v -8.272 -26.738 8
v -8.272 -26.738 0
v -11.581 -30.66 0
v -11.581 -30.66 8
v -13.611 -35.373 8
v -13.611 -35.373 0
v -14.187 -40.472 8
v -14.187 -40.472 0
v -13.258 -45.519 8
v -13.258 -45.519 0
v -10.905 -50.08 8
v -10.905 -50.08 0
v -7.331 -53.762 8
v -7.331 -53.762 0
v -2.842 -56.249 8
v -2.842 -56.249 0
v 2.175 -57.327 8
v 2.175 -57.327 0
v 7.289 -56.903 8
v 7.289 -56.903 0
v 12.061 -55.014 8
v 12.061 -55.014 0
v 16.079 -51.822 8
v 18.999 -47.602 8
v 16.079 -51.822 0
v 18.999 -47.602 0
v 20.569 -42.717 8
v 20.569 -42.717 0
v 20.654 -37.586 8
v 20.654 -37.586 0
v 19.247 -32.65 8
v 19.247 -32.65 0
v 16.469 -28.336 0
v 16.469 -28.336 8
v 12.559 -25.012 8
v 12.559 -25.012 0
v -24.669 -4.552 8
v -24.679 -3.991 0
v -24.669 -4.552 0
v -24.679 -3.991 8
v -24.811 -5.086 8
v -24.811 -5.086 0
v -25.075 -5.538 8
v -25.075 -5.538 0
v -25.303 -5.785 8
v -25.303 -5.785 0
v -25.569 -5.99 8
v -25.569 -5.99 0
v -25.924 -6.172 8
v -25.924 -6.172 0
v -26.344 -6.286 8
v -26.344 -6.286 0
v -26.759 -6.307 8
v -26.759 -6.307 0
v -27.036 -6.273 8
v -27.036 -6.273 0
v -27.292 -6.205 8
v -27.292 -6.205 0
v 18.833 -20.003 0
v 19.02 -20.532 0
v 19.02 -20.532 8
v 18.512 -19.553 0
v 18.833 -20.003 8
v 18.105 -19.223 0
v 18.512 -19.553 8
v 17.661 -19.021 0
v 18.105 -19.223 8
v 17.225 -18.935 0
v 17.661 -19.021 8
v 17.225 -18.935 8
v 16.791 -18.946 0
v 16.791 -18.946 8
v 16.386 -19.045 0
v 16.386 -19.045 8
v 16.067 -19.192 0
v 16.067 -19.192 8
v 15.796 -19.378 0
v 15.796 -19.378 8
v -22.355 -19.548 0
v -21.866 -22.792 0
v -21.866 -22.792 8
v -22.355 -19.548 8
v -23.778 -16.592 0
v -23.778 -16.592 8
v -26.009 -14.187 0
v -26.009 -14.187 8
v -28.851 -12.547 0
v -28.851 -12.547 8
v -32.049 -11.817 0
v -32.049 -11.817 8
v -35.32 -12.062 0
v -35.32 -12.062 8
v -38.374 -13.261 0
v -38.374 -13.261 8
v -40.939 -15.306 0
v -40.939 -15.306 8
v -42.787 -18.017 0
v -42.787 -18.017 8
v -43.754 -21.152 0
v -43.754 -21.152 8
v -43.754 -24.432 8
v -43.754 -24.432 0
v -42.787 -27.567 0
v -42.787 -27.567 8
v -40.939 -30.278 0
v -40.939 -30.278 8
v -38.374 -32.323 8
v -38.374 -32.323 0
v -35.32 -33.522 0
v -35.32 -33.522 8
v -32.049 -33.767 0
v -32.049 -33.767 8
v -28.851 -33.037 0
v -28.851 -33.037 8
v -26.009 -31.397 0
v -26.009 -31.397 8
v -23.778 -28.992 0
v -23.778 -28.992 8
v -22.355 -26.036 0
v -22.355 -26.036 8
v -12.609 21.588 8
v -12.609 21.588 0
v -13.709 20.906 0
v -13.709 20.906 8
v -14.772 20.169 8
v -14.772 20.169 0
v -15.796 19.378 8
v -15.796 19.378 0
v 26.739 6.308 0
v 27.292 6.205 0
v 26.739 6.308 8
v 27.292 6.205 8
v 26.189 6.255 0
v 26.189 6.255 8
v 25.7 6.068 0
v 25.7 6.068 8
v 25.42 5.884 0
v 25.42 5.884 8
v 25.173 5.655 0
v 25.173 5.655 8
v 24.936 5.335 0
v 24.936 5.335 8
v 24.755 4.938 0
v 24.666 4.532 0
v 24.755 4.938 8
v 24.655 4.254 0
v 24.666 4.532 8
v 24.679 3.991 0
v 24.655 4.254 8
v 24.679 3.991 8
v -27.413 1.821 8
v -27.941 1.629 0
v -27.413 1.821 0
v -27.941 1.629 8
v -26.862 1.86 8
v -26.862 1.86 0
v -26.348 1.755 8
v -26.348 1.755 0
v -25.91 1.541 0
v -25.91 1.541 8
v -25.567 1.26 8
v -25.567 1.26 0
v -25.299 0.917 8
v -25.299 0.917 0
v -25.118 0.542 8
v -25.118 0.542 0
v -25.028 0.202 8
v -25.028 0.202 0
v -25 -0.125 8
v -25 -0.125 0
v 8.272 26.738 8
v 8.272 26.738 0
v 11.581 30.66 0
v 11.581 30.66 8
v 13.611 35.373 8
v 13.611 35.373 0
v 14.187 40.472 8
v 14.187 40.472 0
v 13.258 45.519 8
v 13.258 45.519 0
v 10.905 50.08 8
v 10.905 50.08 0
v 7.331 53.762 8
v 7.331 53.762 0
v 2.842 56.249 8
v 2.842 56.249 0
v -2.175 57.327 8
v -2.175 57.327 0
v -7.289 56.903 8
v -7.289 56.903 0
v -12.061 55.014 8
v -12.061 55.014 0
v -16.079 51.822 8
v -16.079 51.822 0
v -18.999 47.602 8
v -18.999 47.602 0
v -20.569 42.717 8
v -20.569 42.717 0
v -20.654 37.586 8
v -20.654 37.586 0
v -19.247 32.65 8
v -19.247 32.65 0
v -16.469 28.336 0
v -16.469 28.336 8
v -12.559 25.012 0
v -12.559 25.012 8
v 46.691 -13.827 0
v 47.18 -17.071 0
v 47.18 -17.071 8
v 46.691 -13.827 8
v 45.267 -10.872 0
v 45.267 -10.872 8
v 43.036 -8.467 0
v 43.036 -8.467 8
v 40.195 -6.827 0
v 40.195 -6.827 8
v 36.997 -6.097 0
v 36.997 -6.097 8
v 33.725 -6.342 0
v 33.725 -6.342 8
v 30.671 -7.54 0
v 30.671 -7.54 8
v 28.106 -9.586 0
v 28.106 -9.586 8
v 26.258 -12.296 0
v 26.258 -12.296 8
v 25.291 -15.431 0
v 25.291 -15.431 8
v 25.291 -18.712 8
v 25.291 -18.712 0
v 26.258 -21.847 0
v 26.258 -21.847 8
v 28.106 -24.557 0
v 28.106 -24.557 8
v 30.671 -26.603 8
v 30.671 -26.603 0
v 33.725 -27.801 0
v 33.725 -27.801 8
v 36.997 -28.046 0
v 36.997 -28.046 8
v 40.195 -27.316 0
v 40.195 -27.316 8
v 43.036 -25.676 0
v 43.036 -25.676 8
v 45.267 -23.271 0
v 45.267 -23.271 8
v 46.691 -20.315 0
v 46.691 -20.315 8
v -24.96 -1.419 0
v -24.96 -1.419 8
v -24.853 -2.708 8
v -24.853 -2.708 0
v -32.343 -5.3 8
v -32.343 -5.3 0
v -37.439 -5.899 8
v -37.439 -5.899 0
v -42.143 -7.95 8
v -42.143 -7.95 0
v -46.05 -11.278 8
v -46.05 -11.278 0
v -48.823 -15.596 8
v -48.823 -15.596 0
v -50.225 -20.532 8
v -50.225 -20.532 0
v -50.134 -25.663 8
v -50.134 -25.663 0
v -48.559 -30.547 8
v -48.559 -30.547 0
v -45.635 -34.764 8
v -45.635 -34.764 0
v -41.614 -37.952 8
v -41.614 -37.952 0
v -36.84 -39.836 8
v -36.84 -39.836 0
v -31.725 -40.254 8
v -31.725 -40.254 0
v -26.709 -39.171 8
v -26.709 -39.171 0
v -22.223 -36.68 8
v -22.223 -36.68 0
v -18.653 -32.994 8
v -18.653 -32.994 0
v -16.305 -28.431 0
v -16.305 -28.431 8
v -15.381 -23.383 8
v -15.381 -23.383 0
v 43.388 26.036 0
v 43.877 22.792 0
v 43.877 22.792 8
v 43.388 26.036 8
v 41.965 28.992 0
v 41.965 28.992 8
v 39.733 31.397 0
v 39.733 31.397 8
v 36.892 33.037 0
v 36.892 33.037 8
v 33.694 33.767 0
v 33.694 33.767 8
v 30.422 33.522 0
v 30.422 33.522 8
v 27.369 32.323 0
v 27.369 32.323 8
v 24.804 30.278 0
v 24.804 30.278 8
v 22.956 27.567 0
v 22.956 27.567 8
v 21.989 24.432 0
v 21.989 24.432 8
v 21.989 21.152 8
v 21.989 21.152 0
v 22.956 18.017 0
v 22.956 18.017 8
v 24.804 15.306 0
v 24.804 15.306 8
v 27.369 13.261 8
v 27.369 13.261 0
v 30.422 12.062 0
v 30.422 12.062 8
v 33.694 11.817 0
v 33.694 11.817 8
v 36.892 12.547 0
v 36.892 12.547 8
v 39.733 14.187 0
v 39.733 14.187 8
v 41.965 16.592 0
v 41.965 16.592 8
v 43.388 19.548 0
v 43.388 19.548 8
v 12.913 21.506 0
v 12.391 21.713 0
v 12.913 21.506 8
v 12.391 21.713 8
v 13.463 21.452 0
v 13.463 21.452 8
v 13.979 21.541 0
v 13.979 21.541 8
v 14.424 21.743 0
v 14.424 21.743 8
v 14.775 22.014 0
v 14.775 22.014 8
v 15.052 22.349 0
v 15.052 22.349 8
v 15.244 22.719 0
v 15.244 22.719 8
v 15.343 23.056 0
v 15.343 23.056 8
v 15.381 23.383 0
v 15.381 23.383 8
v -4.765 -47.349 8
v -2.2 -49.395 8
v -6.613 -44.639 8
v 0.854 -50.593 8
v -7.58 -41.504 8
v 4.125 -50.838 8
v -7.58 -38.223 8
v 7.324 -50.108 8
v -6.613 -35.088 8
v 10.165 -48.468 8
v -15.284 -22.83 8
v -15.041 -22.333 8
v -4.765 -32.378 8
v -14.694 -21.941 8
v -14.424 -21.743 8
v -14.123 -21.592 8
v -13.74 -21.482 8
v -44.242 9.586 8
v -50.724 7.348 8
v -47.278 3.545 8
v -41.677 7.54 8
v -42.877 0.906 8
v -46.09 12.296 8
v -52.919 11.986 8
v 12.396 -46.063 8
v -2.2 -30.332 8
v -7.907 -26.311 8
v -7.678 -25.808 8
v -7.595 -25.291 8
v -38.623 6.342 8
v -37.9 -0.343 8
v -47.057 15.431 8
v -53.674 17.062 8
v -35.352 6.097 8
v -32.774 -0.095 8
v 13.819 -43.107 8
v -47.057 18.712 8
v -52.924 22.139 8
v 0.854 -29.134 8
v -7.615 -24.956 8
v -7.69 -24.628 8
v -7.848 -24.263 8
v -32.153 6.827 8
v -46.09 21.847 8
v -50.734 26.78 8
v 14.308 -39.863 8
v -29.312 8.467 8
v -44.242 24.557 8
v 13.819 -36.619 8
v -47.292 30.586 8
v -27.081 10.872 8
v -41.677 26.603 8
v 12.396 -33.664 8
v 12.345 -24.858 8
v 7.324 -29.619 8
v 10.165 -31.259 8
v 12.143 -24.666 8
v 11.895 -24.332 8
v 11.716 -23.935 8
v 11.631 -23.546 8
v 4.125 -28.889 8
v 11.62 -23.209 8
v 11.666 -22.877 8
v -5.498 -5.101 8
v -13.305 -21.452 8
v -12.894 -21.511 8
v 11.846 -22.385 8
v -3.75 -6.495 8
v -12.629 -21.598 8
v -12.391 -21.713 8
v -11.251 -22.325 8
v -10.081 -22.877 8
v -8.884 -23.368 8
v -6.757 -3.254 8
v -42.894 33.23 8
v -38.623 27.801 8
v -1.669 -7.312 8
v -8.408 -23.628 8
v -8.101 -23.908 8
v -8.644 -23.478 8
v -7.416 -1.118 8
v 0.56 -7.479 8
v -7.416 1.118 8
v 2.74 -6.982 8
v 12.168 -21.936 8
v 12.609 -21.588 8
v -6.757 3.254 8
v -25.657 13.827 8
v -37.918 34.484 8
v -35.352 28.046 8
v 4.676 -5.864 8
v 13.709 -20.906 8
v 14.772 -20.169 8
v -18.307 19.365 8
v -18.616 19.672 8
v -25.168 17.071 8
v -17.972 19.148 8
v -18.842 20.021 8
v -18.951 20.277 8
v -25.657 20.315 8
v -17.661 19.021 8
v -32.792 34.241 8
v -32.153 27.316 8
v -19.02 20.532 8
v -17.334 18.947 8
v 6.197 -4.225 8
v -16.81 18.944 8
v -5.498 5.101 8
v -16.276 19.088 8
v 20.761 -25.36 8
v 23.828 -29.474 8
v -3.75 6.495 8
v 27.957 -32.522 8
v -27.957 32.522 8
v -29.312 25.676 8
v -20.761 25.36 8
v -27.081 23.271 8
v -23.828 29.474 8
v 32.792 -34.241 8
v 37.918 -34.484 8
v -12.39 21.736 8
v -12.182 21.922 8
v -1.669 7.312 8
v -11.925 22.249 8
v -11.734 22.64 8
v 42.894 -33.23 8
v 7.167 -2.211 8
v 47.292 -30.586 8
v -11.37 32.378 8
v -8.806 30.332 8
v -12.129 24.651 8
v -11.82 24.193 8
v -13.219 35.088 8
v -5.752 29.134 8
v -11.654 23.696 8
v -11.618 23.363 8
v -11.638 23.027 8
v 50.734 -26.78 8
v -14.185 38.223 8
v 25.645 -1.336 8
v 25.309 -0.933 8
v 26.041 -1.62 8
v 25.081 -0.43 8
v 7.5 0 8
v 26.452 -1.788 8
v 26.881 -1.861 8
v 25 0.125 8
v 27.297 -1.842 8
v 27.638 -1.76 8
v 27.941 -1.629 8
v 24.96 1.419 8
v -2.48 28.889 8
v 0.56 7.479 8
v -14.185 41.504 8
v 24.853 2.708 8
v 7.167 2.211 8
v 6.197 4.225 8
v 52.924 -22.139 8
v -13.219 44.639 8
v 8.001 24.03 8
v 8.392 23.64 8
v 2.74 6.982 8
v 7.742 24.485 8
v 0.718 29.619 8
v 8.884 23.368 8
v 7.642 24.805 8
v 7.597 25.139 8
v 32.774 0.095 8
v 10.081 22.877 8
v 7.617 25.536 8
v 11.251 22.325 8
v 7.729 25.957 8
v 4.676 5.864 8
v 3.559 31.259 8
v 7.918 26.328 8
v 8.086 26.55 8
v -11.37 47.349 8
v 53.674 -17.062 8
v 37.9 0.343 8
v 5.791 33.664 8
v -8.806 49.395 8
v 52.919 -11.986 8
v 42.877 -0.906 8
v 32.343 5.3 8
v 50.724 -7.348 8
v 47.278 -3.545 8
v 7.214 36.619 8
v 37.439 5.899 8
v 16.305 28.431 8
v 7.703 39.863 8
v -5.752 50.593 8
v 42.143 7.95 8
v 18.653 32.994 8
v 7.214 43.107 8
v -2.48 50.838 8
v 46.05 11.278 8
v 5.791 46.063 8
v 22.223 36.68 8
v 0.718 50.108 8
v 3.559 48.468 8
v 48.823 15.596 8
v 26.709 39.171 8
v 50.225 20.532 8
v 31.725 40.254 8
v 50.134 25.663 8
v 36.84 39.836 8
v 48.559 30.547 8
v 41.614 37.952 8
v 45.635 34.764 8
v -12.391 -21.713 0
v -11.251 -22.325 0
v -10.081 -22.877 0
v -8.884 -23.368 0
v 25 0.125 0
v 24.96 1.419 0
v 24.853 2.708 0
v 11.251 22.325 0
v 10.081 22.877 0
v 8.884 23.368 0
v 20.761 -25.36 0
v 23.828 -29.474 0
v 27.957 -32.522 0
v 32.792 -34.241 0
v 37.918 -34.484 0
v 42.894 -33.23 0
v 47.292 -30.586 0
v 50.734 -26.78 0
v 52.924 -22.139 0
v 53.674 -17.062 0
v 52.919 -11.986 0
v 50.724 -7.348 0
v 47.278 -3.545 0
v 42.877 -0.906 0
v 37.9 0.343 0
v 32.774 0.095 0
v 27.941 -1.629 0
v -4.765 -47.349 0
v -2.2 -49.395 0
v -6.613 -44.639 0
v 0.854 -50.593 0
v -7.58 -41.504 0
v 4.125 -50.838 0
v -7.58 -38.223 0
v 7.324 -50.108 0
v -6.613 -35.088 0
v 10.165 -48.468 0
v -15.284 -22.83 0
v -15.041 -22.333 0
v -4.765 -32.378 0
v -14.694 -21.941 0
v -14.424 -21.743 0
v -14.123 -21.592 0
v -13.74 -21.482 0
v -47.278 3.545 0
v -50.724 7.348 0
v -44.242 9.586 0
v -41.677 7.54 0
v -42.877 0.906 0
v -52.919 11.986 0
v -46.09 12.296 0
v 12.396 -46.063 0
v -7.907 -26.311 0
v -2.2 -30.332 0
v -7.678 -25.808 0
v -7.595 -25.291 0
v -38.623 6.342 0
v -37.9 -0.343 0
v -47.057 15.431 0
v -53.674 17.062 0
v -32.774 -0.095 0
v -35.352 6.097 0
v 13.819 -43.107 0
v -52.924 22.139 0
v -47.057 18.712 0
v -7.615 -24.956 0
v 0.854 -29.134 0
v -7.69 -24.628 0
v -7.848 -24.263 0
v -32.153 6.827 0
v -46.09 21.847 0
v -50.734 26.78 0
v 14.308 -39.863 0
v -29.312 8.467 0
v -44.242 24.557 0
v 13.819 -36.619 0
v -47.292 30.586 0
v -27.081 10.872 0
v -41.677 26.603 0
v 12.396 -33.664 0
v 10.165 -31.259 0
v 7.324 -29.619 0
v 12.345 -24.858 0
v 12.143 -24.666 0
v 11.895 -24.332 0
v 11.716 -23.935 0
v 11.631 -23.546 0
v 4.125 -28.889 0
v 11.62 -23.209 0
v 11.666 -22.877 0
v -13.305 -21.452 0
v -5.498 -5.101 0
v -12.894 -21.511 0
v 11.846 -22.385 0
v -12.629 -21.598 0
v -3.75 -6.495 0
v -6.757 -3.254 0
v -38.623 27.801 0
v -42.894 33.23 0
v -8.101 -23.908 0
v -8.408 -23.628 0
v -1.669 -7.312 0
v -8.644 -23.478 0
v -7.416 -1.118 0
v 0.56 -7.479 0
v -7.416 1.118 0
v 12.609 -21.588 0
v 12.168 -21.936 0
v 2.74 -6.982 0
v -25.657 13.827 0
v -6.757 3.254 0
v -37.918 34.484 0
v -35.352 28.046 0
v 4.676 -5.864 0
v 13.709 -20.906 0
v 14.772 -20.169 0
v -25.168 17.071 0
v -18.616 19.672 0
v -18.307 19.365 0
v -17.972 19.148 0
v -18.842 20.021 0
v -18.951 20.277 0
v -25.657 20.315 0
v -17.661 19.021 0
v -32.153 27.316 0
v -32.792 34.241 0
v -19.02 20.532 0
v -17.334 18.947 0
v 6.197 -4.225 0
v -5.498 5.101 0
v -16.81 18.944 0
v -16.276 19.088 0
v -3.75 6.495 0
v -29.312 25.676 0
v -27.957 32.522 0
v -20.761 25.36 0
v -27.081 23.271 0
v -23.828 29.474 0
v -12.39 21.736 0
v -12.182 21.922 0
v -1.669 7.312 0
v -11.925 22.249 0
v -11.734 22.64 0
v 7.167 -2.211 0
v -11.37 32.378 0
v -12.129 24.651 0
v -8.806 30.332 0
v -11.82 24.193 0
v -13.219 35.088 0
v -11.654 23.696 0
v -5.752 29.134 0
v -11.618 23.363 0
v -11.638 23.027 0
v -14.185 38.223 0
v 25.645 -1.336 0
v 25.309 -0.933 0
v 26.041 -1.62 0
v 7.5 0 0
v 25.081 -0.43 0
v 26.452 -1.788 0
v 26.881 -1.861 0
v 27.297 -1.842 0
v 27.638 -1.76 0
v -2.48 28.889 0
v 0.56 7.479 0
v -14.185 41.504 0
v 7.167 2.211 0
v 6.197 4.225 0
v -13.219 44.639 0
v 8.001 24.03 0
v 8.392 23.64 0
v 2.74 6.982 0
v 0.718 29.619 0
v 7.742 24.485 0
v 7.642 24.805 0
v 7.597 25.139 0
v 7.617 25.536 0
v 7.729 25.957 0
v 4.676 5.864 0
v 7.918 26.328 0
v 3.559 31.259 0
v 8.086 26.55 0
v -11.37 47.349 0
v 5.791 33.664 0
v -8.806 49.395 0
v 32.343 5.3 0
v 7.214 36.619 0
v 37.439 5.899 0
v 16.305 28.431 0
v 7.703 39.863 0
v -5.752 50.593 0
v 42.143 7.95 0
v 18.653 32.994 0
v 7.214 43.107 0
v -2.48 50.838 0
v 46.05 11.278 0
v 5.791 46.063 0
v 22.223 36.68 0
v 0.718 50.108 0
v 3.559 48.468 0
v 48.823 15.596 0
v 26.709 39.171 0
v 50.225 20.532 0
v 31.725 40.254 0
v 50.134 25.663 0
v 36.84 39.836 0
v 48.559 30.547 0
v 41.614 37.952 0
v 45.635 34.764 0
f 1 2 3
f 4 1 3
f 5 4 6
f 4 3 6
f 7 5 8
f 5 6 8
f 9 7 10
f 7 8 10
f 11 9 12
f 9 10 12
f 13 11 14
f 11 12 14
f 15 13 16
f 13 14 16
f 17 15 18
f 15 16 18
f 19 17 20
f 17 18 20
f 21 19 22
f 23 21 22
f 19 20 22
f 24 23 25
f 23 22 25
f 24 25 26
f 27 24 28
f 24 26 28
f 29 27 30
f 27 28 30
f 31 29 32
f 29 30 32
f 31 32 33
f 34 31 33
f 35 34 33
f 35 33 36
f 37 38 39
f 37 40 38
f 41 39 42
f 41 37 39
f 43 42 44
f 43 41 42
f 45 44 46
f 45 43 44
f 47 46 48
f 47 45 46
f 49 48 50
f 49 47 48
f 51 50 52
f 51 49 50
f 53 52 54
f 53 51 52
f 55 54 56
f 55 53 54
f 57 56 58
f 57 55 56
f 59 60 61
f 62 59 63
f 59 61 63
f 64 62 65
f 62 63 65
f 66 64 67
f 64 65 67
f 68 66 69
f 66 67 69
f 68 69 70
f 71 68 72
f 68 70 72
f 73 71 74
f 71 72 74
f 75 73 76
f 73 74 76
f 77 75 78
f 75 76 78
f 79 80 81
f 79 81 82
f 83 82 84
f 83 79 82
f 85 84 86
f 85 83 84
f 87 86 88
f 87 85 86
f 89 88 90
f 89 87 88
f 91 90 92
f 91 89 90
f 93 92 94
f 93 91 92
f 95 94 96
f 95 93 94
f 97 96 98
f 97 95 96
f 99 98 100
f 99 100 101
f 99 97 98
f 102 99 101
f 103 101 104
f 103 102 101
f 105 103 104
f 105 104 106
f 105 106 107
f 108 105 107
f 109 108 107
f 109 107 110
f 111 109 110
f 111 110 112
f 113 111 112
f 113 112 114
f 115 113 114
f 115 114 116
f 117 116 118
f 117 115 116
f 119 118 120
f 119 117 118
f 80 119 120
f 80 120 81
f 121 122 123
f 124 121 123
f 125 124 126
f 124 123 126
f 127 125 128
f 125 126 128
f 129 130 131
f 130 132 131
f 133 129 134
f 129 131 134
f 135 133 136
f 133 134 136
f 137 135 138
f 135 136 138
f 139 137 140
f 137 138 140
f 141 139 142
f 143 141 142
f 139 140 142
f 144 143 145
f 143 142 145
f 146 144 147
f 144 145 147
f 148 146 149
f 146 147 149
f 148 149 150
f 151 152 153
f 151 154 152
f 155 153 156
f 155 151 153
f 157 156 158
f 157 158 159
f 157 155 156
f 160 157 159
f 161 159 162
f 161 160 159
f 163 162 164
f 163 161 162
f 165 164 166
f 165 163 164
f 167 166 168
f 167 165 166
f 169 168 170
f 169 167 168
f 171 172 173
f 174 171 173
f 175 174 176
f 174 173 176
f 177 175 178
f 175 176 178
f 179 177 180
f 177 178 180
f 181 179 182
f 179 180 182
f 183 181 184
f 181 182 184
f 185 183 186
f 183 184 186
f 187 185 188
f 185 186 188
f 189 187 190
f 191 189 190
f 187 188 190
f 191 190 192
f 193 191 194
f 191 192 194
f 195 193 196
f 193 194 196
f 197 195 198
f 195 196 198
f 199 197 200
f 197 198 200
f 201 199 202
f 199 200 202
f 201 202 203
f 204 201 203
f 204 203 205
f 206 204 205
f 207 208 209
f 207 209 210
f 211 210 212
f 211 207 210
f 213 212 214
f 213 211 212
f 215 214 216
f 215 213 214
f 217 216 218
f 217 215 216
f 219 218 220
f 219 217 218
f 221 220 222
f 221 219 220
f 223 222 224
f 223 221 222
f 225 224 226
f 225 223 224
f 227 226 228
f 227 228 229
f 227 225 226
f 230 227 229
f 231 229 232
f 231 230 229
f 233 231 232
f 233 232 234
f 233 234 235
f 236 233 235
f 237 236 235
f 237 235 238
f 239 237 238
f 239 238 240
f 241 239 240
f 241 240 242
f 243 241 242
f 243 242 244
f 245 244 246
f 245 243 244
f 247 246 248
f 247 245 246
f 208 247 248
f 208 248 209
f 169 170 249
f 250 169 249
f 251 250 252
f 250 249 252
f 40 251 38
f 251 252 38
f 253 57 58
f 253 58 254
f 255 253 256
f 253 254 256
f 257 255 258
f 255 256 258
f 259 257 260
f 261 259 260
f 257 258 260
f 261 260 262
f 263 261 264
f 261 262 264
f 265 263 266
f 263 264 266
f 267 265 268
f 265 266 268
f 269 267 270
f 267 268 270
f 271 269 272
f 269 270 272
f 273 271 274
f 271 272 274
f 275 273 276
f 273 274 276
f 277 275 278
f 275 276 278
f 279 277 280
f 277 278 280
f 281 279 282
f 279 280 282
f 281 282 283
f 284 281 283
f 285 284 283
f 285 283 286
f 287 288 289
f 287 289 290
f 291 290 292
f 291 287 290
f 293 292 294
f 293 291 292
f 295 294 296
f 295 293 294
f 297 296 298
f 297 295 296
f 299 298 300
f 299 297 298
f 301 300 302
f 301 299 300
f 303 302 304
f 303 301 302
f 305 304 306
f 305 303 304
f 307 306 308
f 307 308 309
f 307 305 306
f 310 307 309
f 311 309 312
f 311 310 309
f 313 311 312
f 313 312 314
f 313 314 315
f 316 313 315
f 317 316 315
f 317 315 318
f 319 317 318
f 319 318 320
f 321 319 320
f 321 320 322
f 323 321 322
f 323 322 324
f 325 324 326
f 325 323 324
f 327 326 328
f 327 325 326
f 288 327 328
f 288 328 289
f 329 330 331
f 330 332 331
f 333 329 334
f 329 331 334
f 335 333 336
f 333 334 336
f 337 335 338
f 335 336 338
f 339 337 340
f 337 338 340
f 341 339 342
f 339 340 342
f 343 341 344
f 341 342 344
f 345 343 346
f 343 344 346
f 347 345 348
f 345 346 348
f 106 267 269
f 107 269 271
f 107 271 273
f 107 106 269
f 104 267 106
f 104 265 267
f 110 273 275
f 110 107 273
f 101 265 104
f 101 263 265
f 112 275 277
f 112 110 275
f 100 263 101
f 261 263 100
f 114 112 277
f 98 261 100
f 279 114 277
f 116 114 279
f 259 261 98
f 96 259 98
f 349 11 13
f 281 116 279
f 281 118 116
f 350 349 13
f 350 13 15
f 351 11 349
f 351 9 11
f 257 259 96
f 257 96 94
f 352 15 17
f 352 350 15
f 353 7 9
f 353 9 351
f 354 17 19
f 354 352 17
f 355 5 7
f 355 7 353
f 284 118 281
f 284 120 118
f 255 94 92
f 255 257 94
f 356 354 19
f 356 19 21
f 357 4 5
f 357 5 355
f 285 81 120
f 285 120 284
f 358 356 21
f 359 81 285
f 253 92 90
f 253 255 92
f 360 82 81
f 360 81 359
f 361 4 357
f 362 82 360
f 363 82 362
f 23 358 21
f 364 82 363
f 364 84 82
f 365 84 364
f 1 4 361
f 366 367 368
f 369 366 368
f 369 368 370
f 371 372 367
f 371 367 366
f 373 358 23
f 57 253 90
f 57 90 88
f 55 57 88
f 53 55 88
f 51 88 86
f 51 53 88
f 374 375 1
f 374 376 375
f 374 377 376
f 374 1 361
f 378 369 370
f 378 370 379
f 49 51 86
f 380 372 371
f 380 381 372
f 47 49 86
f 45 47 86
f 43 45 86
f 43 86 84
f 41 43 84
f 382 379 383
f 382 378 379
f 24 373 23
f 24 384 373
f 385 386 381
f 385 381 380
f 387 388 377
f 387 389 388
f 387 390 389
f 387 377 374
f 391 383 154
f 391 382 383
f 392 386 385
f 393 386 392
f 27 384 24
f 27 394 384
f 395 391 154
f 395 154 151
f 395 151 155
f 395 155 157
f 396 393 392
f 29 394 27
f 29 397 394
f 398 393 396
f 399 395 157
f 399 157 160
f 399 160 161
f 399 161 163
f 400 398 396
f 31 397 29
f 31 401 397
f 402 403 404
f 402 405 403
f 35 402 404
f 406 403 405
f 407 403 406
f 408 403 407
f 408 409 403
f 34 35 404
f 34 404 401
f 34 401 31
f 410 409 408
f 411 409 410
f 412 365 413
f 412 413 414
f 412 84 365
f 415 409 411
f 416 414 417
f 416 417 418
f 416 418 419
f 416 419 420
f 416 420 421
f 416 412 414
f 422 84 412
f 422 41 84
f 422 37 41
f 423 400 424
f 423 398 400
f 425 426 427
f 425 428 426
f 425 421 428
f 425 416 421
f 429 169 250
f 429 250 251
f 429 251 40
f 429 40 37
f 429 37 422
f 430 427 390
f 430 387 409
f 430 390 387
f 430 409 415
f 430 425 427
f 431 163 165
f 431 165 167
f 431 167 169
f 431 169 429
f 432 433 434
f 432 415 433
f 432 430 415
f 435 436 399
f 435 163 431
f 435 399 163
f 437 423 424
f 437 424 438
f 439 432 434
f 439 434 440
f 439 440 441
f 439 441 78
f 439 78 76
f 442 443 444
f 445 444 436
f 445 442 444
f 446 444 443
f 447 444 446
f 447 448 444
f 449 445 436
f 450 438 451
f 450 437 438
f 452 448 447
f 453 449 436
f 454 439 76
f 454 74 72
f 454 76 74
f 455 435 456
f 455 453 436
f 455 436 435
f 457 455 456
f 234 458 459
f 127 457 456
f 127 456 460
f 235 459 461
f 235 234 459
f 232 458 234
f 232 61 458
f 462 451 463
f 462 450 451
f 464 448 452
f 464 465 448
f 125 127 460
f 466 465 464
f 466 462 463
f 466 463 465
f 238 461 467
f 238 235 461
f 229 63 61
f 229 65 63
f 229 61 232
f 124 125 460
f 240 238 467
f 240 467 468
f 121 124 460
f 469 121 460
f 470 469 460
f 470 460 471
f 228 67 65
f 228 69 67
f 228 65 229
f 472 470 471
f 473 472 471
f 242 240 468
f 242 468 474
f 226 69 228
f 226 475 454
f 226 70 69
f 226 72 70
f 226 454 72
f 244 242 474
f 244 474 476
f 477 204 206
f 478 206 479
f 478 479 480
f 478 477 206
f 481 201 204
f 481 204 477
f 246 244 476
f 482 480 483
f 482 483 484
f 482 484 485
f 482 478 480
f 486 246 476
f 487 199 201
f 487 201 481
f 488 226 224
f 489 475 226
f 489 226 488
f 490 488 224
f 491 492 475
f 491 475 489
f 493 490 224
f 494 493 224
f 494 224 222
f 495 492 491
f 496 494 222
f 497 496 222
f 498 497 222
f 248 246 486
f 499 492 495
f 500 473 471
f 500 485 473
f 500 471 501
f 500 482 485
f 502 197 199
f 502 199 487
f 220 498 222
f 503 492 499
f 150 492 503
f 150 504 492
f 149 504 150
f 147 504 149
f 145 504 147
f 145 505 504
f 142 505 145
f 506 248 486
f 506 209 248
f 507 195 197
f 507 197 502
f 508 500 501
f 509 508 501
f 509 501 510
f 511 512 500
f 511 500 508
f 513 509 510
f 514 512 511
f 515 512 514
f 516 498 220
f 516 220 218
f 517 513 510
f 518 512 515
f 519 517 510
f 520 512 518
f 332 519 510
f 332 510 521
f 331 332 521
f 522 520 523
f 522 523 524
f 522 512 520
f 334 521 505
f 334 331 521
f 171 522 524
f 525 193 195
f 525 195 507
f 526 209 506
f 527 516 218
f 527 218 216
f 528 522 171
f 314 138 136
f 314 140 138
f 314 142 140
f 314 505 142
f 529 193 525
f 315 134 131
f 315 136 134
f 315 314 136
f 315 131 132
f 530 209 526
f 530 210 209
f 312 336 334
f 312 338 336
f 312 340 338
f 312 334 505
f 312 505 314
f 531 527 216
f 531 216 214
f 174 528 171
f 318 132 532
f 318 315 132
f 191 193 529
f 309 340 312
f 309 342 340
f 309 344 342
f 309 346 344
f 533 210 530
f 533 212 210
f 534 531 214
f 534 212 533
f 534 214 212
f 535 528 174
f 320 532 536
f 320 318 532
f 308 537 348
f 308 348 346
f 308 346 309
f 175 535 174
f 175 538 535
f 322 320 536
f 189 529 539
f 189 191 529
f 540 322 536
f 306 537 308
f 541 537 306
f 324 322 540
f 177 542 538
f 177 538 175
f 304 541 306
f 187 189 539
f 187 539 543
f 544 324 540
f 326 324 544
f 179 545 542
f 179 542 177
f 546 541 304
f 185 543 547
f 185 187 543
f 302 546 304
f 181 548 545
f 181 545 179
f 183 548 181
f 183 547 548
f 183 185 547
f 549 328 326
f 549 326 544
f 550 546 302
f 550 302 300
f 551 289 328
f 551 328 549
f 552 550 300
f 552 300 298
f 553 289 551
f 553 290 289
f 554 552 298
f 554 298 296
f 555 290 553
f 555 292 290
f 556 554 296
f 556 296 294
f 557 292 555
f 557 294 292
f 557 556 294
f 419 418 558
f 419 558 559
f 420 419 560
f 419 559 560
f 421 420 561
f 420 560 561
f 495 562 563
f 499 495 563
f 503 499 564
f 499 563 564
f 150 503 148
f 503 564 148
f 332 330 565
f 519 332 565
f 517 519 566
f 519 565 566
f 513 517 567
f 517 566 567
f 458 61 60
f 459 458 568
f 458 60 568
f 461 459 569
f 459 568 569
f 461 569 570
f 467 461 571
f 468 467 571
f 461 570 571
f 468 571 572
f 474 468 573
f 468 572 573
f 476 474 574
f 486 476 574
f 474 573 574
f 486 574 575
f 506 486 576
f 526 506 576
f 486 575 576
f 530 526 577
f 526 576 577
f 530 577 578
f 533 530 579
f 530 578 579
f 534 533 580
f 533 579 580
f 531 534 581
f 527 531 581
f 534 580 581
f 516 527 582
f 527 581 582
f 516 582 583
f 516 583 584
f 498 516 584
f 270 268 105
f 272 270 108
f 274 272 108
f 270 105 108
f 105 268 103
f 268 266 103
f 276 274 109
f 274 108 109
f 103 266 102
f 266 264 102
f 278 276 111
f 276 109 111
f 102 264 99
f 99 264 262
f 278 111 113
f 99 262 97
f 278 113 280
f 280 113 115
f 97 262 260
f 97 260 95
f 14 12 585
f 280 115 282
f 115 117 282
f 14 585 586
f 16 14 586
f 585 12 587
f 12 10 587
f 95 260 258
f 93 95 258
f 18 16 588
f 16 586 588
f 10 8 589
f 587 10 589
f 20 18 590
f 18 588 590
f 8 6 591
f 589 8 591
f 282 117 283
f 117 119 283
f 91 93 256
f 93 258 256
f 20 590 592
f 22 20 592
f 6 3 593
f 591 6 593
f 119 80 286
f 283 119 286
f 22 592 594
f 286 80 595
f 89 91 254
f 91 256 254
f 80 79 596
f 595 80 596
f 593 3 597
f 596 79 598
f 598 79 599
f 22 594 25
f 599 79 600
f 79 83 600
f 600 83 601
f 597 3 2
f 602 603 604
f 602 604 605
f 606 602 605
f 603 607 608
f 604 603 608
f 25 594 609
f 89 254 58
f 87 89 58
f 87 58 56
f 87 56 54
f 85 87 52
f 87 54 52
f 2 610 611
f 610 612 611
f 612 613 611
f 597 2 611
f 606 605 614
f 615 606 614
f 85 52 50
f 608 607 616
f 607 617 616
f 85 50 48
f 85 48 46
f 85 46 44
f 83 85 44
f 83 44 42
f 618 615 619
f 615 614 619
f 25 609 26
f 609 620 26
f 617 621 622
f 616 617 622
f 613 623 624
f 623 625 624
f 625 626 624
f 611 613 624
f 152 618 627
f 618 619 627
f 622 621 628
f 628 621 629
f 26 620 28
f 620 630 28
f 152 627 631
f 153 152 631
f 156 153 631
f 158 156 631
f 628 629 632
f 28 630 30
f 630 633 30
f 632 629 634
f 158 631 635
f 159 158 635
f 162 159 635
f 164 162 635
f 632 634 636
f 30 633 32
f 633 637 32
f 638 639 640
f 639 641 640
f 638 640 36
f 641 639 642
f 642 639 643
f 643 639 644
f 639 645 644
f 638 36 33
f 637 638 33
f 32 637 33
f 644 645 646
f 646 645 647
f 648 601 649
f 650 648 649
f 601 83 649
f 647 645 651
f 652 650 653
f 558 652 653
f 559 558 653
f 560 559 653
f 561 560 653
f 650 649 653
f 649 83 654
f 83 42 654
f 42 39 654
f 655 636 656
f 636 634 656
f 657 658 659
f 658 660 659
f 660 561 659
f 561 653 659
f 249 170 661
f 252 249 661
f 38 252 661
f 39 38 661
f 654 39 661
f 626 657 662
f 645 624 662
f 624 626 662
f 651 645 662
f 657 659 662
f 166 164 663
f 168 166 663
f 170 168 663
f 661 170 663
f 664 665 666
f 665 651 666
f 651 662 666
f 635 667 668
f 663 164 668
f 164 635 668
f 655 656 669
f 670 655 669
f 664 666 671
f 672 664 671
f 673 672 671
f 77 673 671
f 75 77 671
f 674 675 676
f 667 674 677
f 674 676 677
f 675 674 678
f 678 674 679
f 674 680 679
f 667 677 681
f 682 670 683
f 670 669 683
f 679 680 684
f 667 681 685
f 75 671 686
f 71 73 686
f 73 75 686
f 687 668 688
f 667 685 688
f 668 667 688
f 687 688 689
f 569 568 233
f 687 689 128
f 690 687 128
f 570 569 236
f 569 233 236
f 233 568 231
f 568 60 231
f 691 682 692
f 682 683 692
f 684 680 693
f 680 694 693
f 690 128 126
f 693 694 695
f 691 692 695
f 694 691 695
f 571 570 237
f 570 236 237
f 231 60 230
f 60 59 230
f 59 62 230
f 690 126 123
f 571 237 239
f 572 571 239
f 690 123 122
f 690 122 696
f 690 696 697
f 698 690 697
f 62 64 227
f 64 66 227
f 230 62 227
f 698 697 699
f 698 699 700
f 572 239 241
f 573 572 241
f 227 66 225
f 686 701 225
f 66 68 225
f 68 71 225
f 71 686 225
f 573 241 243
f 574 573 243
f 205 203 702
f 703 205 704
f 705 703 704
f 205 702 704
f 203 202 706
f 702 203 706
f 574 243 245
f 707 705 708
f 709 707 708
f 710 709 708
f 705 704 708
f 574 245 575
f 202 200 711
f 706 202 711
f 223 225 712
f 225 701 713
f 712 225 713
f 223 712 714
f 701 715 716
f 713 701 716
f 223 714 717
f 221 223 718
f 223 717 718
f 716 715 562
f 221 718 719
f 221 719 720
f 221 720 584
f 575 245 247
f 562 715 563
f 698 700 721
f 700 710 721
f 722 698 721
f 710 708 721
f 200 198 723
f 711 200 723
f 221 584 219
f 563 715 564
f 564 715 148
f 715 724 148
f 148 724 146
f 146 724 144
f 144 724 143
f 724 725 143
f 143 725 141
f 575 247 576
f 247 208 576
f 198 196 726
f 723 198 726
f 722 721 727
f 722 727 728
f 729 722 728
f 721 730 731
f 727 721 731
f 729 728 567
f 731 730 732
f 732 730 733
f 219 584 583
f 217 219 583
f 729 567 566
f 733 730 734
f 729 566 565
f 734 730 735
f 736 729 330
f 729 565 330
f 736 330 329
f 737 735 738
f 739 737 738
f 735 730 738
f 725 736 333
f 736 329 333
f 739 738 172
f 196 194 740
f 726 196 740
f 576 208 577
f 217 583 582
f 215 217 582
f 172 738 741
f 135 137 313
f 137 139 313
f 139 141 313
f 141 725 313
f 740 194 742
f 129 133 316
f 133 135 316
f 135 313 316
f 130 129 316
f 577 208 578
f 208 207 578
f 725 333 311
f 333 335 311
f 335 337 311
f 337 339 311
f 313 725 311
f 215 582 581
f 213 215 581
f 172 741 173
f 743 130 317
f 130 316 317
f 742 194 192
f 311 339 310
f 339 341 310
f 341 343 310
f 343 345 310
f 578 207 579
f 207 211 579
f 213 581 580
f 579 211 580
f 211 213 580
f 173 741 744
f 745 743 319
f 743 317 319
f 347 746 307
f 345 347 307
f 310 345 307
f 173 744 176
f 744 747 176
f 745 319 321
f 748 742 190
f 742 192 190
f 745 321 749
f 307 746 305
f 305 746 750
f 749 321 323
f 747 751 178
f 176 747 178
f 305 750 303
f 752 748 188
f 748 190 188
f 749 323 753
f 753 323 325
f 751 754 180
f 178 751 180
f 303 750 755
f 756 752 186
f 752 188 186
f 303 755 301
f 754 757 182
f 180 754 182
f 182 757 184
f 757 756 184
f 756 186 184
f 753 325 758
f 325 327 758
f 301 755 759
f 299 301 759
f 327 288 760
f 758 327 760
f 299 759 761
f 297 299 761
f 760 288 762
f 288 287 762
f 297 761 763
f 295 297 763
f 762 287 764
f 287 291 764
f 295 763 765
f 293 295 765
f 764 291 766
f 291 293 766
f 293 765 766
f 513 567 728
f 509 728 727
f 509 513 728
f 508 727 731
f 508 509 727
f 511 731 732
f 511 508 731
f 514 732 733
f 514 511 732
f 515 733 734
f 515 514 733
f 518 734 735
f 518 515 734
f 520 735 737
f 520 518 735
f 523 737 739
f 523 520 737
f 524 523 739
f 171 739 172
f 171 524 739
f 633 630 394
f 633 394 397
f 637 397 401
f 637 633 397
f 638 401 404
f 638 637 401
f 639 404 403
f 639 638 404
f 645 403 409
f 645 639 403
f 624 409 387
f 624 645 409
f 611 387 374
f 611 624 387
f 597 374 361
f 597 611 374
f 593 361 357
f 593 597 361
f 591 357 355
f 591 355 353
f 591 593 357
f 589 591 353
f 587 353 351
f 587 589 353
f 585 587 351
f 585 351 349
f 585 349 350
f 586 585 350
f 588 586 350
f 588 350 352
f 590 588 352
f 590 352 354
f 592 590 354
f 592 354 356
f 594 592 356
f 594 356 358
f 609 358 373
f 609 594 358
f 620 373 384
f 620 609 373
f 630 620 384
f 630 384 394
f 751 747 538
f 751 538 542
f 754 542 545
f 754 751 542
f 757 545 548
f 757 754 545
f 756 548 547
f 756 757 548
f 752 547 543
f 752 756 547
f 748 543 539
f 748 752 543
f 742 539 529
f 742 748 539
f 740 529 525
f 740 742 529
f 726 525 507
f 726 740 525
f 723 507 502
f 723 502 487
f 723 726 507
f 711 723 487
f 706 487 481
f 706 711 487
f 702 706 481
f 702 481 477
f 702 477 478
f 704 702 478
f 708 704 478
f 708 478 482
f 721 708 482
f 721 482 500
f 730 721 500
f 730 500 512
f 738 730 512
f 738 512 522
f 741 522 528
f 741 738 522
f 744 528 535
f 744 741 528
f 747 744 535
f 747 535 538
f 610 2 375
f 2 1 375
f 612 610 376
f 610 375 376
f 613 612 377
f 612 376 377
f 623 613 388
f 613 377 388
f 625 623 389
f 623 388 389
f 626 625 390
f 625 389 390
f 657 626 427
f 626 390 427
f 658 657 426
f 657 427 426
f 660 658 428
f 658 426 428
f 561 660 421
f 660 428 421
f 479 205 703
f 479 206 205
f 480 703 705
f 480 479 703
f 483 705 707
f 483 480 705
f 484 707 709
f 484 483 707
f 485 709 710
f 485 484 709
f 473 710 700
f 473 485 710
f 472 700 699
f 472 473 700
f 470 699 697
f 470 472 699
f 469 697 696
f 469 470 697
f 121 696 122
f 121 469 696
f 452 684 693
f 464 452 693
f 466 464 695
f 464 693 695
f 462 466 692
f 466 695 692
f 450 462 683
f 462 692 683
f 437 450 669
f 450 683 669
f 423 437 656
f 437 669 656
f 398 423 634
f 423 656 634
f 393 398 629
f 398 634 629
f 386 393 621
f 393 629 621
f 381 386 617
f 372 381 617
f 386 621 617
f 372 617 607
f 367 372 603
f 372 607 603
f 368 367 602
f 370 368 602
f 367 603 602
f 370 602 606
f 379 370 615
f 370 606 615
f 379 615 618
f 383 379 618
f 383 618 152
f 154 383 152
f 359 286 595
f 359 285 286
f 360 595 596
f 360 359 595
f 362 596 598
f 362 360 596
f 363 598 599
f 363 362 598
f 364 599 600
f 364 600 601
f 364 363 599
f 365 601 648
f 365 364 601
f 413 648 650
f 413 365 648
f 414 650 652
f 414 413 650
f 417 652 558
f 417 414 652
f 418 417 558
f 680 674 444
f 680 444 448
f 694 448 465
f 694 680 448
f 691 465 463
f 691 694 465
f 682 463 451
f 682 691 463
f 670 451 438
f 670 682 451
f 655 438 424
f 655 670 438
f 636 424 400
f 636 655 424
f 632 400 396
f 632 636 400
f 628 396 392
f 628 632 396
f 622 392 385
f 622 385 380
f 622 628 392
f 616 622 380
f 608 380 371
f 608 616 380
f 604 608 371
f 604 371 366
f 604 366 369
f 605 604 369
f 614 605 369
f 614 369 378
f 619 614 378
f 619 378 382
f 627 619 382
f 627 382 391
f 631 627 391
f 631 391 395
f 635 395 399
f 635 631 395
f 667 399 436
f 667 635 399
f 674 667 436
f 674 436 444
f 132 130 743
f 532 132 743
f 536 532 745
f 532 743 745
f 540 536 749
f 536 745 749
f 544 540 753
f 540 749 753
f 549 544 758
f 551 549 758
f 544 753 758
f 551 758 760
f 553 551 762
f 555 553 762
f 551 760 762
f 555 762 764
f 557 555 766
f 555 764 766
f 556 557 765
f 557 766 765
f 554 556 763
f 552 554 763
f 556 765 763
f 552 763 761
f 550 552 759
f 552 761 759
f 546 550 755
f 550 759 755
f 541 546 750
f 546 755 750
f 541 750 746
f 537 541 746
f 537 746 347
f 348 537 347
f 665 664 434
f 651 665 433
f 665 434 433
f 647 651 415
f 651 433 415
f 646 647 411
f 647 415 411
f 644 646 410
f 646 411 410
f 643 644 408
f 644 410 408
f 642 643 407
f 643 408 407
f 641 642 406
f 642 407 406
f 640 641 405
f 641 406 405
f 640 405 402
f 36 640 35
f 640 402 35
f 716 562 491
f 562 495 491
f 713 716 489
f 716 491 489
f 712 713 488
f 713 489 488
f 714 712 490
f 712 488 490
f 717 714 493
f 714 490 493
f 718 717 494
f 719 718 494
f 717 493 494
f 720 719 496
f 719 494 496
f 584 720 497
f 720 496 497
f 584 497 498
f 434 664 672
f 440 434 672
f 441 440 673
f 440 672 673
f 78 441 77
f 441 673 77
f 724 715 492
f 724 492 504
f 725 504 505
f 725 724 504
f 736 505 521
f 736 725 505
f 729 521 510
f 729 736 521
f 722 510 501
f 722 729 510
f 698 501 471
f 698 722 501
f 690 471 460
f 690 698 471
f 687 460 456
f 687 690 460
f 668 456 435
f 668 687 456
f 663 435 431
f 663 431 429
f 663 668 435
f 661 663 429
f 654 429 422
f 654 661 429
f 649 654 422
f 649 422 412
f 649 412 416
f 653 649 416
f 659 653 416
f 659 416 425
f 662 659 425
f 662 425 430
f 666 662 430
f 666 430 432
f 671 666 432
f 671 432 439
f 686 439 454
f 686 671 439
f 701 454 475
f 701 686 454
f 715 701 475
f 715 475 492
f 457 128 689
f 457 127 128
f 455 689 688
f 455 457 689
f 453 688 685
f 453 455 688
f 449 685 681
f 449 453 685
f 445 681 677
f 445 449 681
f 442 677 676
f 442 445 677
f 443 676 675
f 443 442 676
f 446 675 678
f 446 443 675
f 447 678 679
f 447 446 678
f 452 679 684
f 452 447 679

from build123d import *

# Parameters (mm, degrees)
F0_R     = 11.005661
F0_R_2   = 7.5
F1_DEPTH = 8
F2_R     = 2


with BuildPart() as f1:
    # F0 (on Top) → F1 (new body)
    with BuildSketch(Plane.XY):
        with BuildLine():
            ThreePointArc((15.690977, 19.462612), (10.66965, 22.608816), (5.048904, 24.484864))
            ThreePointArc((5.048904, 24.484864), (-4.747707, 57.303658), (-9.009628, 23.32009))
            ThreePointArc((-9.009628, 23.32009), (-14.244984, 20.544596), (-18.680062, 16.614912))
            ThreePointArc((-18.680062, 16.614912), (-52.000278, 24.540194), (-24.700604, 3.857479))
            ThreePointArc((-24.700604, 3.857479), (-24.914634, -2.064221), (-23.728966, -7.869952))
            ThreePointArc((-23.728966, -7.869952), (-47.25257, -32.763464), (-15.690977, -19.462612))
            ThreePointArc((-15.690977, -19.462612), (-10.66965, -22.608816), (-5.048904, -24.484864))
            ThreePointArc((-5.048904, -24.484864), (4.747707, -57.303658), (9.009628, -23.32009))
            ThreePointArc((9.009628, -23.32009), (14.244984, -20.544596), (18.680062, -16.614912))
            ThreePointArc((18.680062, -16.614912), (52.000278, -24.540194), (24.700604, -3.857479))
            ThreePointArc((24.700604, -3.857479), (24.914634, 2.064221), (23.728966, 7.869952))
            ThreePointArc((23.728966, 7.869952), (47.25257, 32.763464), (15.690977, 19.462612))
        make_face()
        with Locations((-32.871353, -22.791975)):
            Circle(F0_R, mode=Mode.SUBTRACT)
        with Locations((3.302753, -39.863415)):
            Circle(F0_R, mode=Mode.SUBTRACT)
        with Locations((36.174106, -17.071439)):
            Circle(F0_R, mode=Mode.SUBTRACT)
        with Locations((-36.174106, 17.071439)):
            Circle(F0_R, mode=Mode.SUBTRACT)
        with Locations((-3.302753, 39.863415)):
            Circle(F0_R, mode=Mode.SUBTRACT)
        Circle(F0_R_2, mode=Mode.SUBTRACT)
        with Locations((32.871353, 22.791975)):
            Circle(F0_R, mode=Mode.SUBTRACT)
    extrude(amount=F1_DEPTH)

    # F2
    f2_edges = [f1.edges().sort_by_distance(p)[0] for p in [
        (15.690977, 19.462612, 4),
        (5.048904, 24.484864, 4),
        (-9.009628, 23.32009, 4),
        (-18.680062, 16.614912, 4),
        (24.700604, -3.857479, 4),
        (23.728966, 7.869952, 4),
        (18.680062, -16.614912, 4),
        (9.009628, -23.32009, 4),
        (-5.048904, -24.484864, 4),
        (-15.690977, -19.462612, 4),
        (-23.728966, -7.869952, 4),
        (-24.700604, 3.857479, 4),
    ]]
    fillet(f2_edges, radius=F2_R)


solid = f1.part
